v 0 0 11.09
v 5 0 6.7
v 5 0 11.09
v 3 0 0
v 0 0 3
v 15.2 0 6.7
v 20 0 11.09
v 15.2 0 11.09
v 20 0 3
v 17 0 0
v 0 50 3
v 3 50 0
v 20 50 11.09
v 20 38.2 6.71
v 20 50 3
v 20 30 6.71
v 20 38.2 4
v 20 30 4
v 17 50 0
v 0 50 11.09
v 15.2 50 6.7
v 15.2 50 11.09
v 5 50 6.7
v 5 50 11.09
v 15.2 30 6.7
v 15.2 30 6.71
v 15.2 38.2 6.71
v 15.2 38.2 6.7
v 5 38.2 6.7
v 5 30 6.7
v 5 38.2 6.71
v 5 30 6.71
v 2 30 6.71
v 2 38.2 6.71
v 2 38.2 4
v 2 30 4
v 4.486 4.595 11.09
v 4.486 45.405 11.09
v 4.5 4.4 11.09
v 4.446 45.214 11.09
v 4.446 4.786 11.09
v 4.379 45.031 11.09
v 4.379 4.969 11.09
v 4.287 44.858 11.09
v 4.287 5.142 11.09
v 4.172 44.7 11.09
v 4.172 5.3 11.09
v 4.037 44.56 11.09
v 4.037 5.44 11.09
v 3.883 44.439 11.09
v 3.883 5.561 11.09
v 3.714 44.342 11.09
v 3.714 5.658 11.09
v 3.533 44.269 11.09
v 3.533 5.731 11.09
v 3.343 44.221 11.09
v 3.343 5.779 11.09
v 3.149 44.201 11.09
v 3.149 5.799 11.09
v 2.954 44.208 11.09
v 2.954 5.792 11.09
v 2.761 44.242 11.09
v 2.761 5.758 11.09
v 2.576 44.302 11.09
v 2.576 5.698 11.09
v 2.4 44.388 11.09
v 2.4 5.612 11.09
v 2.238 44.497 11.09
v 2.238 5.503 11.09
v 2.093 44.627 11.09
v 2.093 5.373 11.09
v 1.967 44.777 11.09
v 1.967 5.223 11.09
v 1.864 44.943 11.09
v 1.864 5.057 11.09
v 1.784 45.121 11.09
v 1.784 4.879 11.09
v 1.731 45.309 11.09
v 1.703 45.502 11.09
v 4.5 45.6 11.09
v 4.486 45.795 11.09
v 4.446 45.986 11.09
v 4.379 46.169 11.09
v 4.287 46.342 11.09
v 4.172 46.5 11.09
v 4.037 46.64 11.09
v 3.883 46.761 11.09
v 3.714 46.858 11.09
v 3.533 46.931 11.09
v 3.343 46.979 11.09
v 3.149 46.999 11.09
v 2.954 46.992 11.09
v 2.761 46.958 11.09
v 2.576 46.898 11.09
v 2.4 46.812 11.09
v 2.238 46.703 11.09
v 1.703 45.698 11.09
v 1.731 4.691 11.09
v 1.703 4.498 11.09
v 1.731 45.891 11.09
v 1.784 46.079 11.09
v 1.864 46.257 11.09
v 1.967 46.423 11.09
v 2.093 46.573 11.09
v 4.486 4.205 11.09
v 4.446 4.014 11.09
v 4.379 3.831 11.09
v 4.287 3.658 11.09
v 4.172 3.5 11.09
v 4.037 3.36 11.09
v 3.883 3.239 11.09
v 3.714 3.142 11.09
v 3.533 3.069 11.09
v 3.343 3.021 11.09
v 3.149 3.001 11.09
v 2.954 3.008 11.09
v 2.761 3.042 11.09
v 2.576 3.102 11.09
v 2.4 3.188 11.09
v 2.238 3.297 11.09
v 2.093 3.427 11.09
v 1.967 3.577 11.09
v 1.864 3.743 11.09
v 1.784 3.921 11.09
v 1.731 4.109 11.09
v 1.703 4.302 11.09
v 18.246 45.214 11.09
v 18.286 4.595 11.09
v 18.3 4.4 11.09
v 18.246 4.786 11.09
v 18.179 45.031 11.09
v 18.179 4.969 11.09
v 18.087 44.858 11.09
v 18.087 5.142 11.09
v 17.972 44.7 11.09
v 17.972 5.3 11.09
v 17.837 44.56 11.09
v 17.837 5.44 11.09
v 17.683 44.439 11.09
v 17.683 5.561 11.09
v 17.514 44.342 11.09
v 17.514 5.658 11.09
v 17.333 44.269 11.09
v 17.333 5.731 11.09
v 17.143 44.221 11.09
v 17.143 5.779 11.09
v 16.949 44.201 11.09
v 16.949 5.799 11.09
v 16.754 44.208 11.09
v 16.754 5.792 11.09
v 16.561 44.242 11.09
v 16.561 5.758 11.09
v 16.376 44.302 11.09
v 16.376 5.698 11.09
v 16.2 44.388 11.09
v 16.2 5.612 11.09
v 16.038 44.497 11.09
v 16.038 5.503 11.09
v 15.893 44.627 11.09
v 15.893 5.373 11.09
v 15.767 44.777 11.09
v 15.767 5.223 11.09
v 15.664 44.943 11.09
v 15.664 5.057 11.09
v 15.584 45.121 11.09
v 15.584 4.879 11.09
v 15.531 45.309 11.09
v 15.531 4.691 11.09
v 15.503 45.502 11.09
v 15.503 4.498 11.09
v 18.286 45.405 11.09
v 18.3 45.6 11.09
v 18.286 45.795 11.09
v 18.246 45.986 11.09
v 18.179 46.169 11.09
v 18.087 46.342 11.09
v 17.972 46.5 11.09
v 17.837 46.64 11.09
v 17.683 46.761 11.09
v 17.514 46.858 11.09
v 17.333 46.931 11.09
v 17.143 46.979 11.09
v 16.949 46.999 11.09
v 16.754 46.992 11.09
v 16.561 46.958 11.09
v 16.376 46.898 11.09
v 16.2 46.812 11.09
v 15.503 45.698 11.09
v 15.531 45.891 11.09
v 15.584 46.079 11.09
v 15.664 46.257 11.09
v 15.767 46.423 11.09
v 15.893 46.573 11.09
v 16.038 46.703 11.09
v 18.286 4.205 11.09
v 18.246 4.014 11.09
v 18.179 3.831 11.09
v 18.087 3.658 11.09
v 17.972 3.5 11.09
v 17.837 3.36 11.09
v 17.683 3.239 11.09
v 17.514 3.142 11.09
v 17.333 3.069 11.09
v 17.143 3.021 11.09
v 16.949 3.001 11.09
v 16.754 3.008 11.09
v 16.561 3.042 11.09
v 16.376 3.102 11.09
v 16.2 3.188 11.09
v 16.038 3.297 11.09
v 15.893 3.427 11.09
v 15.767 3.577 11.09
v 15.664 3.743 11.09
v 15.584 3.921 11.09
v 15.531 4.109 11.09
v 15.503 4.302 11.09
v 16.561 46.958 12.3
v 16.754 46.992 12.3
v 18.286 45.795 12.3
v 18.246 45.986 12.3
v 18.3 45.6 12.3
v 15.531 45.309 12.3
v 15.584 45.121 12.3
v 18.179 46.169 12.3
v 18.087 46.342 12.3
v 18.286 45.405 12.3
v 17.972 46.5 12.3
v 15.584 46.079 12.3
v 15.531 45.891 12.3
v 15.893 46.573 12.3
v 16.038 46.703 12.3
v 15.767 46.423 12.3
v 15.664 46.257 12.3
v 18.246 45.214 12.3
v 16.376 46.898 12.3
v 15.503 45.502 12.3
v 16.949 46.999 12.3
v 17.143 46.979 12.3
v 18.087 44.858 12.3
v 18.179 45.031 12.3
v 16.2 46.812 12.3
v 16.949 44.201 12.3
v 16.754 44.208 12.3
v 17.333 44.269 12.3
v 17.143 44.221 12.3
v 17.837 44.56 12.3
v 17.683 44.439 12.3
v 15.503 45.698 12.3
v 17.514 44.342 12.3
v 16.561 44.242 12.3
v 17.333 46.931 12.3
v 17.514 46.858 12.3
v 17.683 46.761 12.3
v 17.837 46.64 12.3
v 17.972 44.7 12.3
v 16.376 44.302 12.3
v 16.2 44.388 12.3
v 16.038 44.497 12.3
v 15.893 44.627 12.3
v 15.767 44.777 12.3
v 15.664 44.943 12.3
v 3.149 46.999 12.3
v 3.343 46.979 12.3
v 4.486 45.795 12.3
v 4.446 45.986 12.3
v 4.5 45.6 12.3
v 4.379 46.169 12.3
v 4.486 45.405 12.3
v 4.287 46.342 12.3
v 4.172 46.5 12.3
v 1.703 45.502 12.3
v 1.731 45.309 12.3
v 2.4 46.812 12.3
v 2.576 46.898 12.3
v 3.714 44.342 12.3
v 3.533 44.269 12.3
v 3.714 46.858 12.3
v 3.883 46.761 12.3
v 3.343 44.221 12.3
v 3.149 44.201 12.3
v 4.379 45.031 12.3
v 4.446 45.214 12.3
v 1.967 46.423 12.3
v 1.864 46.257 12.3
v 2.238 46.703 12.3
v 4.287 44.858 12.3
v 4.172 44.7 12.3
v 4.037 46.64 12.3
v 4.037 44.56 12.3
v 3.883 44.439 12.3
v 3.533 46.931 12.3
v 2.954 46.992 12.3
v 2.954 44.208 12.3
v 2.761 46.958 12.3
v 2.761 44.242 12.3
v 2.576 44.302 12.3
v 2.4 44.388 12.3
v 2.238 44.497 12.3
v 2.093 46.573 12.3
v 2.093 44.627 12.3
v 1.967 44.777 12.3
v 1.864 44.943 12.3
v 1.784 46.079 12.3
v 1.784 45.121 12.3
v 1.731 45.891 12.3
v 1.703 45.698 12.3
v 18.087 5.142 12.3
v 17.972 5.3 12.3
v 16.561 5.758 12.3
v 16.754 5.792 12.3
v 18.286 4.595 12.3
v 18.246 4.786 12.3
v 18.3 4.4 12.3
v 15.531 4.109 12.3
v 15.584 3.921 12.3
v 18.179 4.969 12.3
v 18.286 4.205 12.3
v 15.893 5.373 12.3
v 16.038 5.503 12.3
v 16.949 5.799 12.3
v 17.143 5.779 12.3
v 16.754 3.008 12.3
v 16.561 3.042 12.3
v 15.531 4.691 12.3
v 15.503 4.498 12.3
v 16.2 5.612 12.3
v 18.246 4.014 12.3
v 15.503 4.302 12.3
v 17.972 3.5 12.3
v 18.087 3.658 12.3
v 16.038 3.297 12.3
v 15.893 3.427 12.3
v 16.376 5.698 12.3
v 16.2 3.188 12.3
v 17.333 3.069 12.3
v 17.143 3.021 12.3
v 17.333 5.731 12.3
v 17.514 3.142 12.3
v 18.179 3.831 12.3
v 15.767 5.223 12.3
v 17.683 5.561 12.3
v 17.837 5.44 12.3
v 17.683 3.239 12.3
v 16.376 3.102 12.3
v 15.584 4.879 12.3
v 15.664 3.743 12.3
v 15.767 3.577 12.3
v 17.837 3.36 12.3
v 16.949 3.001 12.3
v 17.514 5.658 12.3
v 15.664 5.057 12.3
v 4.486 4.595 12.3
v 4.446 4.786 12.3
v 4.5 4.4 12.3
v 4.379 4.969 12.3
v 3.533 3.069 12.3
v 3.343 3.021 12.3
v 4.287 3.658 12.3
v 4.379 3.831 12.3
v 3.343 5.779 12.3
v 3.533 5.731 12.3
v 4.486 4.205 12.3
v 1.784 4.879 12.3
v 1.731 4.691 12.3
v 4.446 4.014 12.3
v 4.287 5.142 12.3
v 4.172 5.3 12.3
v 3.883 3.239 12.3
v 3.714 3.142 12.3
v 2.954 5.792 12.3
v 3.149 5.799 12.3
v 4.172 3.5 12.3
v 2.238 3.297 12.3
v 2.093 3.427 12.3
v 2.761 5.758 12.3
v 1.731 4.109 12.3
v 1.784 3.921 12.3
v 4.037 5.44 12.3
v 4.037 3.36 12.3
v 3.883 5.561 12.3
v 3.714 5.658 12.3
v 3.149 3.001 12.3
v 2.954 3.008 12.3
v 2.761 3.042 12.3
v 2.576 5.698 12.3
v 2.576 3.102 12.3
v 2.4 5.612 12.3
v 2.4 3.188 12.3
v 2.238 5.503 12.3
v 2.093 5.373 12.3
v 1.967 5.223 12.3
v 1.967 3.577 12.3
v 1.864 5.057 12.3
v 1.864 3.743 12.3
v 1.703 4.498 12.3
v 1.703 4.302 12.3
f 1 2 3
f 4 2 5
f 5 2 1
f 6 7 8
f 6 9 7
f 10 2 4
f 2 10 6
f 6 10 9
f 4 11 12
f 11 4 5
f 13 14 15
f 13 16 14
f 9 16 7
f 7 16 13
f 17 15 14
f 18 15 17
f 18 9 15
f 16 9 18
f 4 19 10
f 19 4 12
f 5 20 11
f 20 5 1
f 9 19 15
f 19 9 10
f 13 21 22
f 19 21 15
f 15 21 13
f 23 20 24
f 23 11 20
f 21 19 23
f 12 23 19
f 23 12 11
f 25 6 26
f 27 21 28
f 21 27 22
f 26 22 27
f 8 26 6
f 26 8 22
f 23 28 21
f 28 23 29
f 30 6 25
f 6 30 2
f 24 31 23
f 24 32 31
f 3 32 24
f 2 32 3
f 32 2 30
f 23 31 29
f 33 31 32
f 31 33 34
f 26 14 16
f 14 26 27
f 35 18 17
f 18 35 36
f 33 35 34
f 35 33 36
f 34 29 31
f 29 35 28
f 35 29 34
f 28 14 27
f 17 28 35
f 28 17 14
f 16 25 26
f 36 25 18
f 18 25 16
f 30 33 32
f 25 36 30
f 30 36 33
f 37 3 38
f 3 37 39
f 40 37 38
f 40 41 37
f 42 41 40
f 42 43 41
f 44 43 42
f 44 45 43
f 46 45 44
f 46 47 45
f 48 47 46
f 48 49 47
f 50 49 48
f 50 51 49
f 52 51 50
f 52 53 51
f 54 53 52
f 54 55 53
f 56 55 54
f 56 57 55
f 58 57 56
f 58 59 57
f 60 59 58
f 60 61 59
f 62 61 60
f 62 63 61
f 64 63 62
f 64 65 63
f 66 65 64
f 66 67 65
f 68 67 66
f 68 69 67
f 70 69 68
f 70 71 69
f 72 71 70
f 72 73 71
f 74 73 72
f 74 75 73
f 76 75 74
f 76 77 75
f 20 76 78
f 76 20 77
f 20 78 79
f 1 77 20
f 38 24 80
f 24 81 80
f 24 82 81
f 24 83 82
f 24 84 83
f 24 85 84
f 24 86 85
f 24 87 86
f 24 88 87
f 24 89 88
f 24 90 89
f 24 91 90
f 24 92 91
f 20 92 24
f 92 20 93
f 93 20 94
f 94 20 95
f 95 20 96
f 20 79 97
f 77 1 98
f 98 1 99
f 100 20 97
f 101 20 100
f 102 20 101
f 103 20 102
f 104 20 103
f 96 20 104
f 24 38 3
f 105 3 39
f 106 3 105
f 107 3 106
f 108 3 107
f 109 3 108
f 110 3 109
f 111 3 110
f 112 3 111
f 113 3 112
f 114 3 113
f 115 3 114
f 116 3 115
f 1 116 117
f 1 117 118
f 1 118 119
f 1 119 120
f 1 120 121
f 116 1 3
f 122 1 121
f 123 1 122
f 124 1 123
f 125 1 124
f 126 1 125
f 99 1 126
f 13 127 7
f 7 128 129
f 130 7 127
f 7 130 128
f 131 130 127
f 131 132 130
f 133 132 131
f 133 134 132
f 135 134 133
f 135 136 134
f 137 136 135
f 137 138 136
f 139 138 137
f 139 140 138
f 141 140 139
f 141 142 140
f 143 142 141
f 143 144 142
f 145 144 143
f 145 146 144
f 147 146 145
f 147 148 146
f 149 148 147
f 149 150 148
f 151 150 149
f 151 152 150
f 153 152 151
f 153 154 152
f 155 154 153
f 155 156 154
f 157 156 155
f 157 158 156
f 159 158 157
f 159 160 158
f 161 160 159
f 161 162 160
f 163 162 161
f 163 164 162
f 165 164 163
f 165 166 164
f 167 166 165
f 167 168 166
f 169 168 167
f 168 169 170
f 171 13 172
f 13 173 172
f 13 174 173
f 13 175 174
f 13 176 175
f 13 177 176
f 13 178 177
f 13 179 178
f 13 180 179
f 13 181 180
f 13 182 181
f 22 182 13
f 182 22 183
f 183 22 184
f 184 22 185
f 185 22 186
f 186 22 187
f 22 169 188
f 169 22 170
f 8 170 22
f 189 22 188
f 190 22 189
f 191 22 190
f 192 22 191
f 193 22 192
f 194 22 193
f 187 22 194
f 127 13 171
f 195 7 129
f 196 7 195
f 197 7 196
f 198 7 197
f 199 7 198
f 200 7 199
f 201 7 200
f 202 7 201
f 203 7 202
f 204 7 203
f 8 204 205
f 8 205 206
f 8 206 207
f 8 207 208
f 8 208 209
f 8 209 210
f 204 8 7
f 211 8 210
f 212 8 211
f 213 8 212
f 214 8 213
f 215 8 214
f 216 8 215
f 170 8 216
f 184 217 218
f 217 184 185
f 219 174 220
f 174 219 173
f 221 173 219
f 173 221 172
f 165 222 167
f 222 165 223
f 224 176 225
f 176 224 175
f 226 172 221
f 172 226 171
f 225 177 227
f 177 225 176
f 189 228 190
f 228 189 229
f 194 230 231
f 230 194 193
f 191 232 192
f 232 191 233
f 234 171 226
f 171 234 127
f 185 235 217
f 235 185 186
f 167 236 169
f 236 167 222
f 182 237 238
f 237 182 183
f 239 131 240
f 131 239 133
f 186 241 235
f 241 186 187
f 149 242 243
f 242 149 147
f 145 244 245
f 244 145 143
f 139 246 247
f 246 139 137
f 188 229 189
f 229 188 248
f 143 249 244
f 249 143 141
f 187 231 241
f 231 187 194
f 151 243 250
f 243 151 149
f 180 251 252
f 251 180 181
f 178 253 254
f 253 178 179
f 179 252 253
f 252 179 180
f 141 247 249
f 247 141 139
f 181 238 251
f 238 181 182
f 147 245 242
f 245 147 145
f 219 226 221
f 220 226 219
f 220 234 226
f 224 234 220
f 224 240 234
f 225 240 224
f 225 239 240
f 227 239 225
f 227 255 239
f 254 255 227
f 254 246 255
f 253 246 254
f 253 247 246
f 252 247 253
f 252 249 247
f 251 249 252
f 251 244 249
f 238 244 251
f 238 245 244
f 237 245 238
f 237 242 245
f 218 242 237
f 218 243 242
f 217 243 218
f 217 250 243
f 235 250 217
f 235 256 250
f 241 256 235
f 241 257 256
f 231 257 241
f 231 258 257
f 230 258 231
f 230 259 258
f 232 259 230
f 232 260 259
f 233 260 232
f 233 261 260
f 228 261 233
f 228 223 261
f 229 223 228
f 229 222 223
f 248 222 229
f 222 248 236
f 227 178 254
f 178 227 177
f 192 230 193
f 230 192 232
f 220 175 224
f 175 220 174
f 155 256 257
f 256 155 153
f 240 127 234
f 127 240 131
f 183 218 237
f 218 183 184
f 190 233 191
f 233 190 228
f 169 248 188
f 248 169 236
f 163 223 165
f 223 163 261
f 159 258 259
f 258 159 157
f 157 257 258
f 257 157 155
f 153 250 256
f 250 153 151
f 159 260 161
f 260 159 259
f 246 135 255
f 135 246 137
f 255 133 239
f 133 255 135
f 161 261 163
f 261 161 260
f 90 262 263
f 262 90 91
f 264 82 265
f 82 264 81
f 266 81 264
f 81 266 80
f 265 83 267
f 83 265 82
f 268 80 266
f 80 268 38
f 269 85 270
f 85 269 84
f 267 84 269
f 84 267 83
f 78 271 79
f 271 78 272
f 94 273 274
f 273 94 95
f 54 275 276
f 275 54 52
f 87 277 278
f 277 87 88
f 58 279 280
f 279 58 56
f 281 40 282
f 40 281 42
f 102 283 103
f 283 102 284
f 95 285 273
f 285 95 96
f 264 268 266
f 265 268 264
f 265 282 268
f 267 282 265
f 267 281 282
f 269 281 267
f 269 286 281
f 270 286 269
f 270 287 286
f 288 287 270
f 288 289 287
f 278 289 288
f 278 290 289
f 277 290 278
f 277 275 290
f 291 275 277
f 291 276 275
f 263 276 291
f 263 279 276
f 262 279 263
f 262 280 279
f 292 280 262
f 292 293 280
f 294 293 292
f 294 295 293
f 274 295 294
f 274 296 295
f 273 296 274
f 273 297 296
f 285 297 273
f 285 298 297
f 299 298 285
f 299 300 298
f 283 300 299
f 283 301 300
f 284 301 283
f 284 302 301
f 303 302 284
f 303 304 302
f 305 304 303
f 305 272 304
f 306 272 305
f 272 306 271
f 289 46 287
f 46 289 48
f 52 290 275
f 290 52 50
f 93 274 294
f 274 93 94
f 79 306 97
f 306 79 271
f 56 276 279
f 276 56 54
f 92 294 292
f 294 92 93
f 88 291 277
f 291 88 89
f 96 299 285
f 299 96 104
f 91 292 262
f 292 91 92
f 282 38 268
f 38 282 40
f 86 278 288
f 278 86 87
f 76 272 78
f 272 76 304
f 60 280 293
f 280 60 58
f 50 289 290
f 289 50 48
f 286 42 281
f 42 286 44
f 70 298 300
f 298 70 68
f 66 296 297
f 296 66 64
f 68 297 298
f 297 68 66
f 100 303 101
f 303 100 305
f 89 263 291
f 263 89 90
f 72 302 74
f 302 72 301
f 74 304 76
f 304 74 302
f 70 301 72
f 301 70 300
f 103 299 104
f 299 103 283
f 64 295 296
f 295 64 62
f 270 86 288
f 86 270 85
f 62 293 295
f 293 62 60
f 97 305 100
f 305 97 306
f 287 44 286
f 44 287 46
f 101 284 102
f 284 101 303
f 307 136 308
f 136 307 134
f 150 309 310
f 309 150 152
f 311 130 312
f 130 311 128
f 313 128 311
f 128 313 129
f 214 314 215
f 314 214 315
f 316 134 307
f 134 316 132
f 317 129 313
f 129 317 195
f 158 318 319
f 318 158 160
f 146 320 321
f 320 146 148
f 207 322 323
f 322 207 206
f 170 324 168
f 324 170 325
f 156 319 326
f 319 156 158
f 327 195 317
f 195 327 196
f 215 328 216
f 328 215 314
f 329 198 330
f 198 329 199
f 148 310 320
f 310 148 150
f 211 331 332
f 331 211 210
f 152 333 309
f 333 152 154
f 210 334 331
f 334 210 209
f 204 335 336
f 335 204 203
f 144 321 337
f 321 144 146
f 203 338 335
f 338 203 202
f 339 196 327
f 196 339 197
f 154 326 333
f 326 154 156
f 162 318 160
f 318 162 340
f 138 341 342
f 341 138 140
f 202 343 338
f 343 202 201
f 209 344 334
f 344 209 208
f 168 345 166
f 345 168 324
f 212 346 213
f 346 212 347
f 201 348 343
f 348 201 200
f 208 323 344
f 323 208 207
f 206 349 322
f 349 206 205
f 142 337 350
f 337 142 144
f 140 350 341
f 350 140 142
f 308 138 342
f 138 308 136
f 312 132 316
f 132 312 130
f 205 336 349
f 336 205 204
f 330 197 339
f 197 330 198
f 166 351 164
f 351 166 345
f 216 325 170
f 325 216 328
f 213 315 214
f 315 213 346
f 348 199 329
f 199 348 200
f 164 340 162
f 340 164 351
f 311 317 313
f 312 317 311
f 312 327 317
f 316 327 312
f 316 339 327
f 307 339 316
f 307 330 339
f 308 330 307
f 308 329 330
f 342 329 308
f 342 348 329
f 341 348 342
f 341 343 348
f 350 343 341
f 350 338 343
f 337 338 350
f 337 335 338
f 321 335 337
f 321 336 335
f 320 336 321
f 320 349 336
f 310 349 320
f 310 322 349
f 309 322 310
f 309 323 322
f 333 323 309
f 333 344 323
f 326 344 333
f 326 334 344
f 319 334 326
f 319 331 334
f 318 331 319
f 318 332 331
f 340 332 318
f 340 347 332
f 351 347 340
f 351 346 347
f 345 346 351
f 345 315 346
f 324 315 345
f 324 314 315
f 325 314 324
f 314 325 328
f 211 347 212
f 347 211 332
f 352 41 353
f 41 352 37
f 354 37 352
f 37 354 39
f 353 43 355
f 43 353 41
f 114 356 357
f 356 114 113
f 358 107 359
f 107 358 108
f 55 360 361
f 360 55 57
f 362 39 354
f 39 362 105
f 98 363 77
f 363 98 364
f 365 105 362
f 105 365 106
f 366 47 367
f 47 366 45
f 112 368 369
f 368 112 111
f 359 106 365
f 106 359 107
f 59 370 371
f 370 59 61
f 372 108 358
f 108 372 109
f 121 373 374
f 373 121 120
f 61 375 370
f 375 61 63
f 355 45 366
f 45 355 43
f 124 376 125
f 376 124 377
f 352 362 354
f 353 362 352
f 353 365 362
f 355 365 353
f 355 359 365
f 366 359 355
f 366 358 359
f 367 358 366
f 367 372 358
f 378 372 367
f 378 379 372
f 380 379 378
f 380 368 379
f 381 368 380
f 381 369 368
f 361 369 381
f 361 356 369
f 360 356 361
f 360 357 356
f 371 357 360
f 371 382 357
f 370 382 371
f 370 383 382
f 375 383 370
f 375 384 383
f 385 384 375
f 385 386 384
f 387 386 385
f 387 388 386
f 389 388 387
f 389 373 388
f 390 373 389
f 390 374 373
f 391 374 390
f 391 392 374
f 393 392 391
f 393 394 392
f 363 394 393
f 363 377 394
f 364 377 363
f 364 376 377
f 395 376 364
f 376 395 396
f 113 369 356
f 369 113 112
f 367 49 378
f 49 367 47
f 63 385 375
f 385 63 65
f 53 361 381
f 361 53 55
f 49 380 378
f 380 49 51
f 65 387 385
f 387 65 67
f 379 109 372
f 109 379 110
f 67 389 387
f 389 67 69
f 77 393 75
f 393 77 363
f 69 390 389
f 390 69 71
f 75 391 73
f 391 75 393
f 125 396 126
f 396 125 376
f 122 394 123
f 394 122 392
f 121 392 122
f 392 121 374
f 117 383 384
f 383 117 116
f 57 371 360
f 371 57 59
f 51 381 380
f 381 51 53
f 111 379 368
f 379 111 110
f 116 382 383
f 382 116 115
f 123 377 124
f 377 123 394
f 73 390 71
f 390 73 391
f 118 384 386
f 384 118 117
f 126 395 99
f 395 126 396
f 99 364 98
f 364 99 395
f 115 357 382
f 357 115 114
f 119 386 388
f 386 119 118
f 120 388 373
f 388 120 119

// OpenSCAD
include <../libs/pw_primitives.scad>;

$fn=45;

eps = 0.01;
tolerance = 0.2;

text_len = 5; text_thick = 1;
magnet_dia = 6;
magnet_thick = 2;
slider_len = 100;
slider_wid = 10;
slider_thick = 4;
slider_hole_offset = 85;
switcher_x_offset = 2;  switcher_x_extra = 1; switcher_z_offset = 0.5;
switcher_wid = magnet_dia + switcher_x_extra*2;
switcher_thick = magnet_thick + switcher_z_offset;
body_len = 50;
body_x_wall = 5; body_z_wall = 4;
body_wid = slider_wid+body_x_wall*2;
body_thick = slider_thick+switcher_thick+body_z_wall*2;
body_chamfer = 3;
tube_x_offset = body_wid/2+magnet_dia; tube_y_offset = 30;
tube_thick = 30;  tube_outer_dia = 12;  tube_inner_dia = magnet_dia+tolerance*2;
switcher_len = body_wid - switcher_x_offset + text_len;
slider_z_offset = body_z_wall + switcher_thick + tolerance;
peg_dia = 2.4;  peg_height = 1.6;
peg_x_offset = 0.5; peg_y_offset = 2; peg_tol = 0.25;
peg_x = slider_wid/2 - peg_x_offset + peg_dia;
peg_y = body_len/2 - peg_y_offset - peg_dia;

// pegs at the corners of a box from -x,-y to x,y
module pegs(x, y, r, h) {
    translate([ x,  y, 0]) cylinder(r=r, h=h);
    translate([-x,  y, 0]) cylinder(r=r, h=h);
    translate([ x, -y, 0]) cylinder(r=r, h=h);
    translate([-x, -y, 0]) cylinder(r=r, h=h);
}


// body - base
union() {
    difference() {
        chamfered_cube(
            body_wid, body_len, body_thick, body_chamfer,
            chamfer_y=false, center=false);
        // The slider channel
        translate([body_x_wall, -eps, slider_z_offset]) 
          cube([slider_wid+tolerance, body_len+eps*2, slider_thick+tolerance*2]);
        // The channel for the magnet switcher
        translate([switcher_x_offset, tube_y_offset, body_z_wall]) 
          // rotated: switch x/y
          cube([switcher_len, switcher_wid+tolerance, switcher_thick+tolerance+eps]); 
        // Remove the top of the body
        translate([-eps, -eps, slider_z_offset+slider_thick+tolerance*2-eps]) 
          cube([body_wid+eps*2, body_len+eps*2, body_z_wall+tolerance]);
    }
    // The pegs - centred on centre of body
    translate([body_wid/2, body_len/2, slider_z_offset+slider_thick]) 
      pegs(peg_x, peg_y, peg_dia/2+tolerance, peg_height);
}

// the body - upper
* translate([-30, 0, 0]) difference() {
    // the base and outer tube
    translate([0, 0, -(slider_z_offset+slider_thick+tolerance*2)]) union() {
        translate([body_wid/2, tube_y_offset+switcher_wid/2, 0]) 
          cylinder(h=tube_thick, d=tube_outer_dia);
        chamfered_cube(
            body_wid, body_len, body_thick, body_chamfer,
            chamfer_y=false, center=false);
    }
    // Everything below the upper
    translate([-eps, -eps, -body_thick]) 
      cube([body_wid+eps*2, body_len+eps*2, body_thick]);
    // The feeder tube
    translate([body_wid/2, tube_y_offset+switcher_wid/2, -eps]) 
      cylinder(h=tube_thick+1, d=tube_inner_dia);
    // the pegs, removed
    translate([body_wid/2, body_len/2, -eps]) 
      pegs(peg_x, peg_y, peg_dia/2+peg_tol, peg_height+peg_tol+eps);
}

// reversible magnet holder - slide into the side, pull out to flip upside down
// translate([switcher_x_offset, tube_y_offset+switcher_wid+tolerance, body_z_wall]) 
//   rotate([0, 0, -90]) 
* translate([-50, 0, 0]) difference() {
    // the slide and N
    union() {
        cube([switcher_wid, switcher_len, switcher_thick]);
        translate([switcher_wid/2, switcher_len-text_len+1, switcher_thick-eps]) 
          linear_extrude(text_thick) text(
            "N", size=6, font="Liberation Sans:style=Regular", 
            halign="center", valign="center"
          );
        translate([-1, body_wid-body_x_wall, 0]) cube([switcher_wid+2, 1, switcher_thick+1]);
    };
    // the magnet hole
    translate([switcher_wid/2, slider_wid/2, switcher_thick-magnet_thick+eps]) 
      cylinder(d=magnet_dia+tolerance*2, h=magnet_thick);
    // the bottom text
    translate([switcher_wid/2, switcher_len-text_len+1, -eps]) 
      mirror([1, 0, 0]) linear_extrude(text_thick) text(
        "S", size=6, font="Liberation Sans:style=Regular", 
        halign="center", valign="center"
      );
}

// the slider
* translate([30, 0, 0]) difference() {
    cube([slider_wid, slider_len, slider_thick]);
    // the magnet hole
    translate([slider_wid/2, slider_hole_offset+magnet_dia/2, magnet_thick]) 
      cylinder(h=magnet_thick+eps, d=magnet_dia+tolerance);
    // the area for the base of the magnet placer to fit in, with a ridge to
    // stop other magnets falling into that space.
    translate([slider_wid/2, slider_hole_offset+magnet_dia/2, slider_thick-magnet_thick/2])
      difference () {
        translate([-slider_wid/2-epsilon, -5.5, 0]) cube([slider_wid+epsilo2, 11, slider_thick]);
        translate([-1, -5.5, 0]) cube([2, 11, slider_thick]);
    }
}
